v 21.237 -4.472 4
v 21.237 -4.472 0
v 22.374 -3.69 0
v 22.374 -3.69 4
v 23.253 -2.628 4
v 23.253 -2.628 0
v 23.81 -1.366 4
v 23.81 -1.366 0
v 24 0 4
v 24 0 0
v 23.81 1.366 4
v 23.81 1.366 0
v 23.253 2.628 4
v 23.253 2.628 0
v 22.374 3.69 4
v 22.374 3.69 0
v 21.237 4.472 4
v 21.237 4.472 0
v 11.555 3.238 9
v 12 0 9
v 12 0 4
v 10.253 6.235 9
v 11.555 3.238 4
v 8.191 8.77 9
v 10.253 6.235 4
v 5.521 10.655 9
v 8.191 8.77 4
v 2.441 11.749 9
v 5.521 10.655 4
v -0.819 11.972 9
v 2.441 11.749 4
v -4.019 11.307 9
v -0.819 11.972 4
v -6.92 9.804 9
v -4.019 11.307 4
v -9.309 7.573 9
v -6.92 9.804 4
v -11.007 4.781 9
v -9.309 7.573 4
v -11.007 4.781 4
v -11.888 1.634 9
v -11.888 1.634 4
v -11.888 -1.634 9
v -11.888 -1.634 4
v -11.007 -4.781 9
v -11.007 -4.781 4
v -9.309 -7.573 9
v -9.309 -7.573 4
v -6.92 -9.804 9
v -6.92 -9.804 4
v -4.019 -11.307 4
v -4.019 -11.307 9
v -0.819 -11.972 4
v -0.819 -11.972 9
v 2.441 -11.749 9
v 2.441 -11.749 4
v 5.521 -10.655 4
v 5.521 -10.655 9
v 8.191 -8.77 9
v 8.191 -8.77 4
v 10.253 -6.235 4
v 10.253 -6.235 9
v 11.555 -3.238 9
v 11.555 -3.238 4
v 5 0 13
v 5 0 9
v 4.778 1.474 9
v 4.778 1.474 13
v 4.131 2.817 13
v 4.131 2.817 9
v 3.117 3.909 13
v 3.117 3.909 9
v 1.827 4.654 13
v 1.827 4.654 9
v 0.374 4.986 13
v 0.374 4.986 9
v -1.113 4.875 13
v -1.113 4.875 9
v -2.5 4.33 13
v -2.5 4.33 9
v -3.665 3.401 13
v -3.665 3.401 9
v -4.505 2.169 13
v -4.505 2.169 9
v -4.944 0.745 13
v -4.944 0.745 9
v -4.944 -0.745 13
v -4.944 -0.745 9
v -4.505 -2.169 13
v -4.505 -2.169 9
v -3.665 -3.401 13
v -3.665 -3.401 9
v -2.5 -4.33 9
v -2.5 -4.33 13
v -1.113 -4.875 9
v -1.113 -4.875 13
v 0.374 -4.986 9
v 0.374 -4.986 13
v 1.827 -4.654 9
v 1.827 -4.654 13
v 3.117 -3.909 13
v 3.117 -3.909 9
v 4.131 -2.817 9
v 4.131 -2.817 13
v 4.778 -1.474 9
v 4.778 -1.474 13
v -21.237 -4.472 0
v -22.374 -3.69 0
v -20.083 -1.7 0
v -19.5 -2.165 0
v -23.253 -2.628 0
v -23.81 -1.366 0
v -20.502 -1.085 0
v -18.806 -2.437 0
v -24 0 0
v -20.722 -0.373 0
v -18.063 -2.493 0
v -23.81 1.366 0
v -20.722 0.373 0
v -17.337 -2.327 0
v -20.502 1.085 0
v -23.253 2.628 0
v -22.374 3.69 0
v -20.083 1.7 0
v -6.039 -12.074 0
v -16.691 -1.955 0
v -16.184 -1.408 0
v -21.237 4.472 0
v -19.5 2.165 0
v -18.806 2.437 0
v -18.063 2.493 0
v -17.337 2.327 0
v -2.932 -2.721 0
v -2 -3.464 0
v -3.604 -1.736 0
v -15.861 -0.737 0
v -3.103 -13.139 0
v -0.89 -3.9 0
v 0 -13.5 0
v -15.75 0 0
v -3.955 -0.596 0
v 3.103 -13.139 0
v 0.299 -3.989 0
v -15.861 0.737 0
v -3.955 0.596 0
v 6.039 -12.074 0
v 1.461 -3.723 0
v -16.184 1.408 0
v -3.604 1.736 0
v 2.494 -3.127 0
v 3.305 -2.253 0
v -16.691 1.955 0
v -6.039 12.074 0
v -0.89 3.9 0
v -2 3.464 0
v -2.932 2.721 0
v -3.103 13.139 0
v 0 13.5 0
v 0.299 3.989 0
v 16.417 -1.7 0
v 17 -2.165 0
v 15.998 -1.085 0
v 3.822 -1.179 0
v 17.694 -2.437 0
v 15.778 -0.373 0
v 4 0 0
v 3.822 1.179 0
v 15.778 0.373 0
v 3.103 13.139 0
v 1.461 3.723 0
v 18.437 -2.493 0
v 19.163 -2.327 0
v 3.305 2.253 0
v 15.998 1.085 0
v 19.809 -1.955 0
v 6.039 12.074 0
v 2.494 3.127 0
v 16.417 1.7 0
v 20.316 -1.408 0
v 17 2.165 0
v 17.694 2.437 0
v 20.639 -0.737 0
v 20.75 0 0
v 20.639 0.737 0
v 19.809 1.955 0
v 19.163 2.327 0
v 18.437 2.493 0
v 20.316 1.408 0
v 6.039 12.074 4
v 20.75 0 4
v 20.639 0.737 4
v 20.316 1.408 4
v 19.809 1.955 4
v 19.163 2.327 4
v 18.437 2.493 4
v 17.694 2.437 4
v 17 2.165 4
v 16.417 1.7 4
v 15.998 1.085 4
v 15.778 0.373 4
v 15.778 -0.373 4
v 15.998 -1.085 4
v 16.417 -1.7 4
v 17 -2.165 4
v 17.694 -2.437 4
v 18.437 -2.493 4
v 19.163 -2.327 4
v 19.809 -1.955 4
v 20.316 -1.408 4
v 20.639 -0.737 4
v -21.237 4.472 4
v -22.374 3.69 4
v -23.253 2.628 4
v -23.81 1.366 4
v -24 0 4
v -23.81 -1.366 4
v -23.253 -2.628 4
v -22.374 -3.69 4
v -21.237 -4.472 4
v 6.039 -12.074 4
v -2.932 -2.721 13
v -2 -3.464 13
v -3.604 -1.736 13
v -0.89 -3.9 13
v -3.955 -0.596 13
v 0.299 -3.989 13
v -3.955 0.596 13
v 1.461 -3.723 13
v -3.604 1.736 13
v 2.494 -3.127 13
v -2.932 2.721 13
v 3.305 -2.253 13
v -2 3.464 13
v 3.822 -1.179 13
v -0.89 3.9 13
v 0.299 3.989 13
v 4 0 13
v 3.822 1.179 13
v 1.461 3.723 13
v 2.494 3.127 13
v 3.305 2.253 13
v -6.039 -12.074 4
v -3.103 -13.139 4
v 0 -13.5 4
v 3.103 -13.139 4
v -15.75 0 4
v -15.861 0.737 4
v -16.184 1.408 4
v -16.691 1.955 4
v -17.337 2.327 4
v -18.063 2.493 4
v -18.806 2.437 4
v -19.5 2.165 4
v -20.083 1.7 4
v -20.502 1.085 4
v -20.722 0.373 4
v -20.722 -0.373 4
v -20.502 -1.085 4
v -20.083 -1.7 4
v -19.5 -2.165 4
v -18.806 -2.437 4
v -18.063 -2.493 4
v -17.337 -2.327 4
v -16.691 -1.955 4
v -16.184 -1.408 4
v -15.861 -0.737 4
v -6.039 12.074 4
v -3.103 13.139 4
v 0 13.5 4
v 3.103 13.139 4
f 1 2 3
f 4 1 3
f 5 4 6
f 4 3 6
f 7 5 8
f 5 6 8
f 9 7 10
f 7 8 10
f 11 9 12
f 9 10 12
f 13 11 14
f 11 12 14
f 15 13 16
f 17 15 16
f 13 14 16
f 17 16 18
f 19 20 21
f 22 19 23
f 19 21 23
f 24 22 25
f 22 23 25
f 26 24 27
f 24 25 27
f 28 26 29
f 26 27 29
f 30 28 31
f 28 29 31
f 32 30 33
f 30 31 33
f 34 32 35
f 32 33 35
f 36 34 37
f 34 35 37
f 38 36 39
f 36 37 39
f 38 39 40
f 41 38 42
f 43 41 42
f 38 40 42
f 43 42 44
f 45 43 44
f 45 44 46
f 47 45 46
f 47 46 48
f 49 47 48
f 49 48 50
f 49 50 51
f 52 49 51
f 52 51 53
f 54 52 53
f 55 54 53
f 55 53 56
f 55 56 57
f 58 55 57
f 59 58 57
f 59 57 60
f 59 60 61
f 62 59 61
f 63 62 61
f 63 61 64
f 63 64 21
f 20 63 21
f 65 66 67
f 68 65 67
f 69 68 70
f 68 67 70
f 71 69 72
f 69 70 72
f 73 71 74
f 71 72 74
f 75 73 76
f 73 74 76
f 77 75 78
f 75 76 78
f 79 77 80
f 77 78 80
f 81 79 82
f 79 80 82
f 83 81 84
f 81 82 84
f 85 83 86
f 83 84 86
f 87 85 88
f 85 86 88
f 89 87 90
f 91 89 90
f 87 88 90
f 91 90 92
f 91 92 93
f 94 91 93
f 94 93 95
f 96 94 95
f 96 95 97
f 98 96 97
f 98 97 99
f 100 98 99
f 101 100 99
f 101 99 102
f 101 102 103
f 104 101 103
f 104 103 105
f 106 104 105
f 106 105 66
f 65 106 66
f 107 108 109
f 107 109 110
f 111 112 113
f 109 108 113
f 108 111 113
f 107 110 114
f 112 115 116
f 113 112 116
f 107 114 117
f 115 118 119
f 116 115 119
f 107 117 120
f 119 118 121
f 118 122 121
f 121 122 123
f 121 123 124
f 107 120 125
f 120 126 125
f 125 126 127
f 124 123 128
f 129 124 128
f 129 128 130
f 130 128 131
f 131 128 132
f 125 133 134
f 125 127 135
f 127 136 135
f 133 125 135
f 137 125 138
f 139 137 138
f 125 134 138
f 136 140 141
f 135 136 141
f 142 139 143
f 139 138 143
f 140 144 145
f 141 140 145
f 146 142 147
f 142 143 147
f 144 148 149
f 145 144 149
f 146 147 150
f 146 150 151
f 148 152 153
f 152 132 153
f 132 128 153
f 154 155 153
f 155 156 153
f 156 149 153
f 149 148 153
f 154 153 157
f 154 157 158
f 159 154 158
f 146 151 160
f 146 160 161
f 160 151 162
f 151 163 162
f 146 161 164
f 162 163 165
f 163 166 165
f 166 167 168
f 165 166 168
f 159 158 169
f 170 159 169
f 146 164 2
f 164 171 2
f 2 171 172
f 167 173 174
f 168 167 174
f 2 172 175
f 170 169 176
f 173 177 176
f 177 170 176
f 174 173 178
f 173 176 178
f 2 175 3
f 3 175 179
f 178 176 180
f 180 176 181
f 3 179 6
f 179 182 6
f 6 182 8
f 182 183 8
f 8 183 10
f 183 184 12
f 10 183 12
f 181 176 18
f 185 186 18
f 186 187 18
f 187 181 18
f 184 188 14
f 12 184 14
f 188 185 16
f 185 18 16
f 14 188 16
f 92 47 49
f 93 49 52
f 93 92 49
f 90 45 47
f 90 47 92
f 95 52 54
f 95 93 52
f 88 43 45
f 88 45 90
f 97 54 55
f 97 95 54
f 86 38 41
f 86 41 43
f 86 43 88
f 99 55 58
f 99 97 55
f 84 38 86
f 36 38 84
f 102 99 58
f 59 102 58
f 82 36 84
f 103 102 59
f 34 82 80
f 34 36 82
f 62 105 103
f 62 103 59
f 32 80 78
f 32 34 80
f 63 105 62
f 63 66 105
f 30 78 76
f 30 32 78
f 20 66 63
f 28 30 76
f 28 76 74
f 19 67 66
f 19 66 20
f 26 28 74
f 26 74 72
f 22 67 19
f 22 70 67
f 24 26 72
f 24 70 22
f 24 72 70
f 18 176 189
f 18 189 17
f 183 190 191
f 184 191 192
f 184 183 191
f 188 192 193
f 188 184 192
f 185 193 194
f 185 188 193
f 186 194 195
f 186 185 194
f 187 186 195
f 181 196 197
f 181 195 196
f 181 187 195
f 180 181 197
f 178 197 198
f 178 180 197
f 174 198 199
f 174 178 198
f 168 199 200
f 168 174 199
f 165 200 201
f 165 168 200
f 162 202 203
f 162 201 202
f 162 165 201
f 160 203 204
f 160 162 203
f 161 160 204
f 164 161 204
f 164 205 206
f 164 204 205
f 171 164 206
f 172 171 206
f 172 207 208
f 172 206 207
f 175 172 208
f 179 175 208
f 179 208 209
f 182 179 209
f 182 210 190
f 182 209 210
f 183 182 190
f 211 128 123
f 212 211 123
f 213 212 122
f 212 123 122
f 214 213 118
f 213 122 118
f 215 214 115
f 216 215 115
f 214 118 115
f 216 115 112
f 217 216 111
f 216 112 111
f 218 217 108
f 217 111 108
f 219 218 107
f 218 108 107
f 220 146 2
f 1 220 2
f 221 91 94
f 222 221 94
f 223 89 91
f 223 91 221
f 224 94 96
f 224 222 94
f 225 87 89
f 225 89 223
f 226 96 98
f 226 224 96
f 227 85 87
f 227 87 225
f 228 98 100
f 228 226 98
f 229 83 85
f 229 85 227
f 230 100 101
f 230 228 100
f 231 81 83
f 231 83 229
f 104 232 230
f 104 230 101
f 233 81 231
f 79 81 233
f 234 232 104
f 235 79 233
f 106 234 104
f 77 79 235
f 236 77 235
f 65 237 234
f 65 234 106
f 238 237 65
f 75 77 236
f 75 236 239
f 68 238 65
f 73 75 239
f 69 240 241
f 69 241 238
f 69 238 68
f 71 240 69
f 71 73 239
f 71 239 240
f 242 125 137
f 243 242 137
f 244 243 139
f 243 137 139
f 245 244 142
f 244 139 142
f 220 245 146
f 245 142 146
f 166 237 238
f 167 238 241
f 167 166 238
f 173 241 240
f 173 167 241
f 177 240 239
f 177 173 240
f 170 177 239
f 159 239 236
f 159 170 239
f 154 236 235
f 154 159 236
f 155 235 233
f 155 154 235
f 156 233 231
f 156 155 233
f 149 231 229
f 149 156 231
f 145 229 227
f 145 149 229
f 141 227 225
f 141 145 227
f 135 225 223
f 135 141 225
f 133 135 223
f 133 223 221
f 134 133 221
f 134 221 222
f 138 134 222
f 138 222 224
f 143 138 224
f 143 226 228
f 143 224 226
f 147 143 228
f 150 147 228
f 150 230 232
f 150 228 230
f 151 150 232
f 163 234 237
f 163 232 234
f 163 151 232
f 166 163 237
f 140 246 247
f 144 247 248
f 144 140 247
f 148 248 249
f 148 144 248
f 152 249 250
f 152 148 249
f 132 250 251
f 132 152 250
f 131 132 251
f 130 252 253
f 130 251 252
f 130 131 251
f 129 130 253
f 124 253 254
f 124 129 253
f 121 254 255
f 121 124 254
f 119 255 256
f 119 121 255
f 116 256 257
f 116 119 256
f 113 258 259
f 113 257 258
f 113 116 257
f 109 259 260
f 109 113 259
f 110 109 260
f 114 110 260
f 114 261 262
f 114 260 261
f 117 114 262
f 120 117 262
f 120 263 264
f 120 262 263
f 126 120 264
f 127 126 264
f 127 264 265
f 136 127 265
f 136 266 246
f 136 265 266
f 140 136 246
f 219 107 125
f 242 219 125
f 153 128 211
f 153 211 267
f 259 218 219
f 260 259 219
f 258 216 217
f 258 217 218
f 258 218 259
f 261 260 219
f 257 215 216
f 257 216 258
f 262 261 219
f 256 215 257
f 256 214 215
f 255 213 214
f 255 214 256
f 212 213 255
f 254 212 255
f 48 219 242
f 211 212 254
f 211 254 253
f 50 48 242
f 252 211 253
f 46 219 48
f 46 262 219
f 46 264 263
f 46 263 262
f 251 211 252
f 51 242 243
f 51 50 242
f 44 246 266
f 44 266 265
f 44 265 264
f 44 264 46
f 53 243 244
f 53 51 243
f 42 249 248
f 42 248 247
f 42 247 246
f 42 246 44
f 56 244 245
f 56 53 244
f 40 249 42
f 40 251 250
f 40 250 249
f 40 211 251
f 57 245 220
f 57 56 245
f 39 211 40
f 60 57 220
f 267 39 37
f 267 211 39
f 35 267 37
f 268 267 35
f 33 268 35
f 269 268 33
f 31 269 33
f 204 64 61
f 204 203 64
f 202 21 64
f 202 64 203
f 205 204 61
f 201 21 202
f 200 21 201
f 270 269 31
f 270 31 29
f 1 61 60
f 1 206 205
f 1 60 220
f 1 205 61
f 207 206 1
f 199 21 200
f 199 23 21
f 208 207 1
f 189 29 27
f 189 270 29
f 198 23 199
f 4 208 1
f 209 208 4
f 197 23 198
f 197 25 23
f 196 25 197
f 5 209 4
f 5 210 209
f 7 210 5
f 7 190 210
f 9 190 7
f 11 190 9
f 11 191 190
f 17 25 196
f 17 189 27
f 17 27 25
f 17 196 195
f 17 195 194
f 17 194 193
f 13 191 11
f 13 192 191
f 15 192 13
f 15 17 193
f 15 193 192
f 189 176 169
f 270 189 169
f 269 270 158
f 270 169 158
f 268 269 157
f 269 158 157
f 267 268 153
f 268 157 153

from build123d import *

# Parameters (mm, degrees)
PAD003_DEPTH      = 4
SKETCH002_R       = 12
PAD_DEPTH         = 9
SKETCH003_R       = 5
PAD004_DEPTH      = 13
SKETCH001_R       = 4
SKETCH001_R_2     = 2.5
POCKET_DEPTH      = 0.001
POCKET_DEPTH_BACK = -13.001


with BuildPart() as part:
    # Sketch004 → Pad003 (new body)
    with BuildSketch(Plane.XY):
        with BuildLine():
            ThreePointArc((-21.23684, 4.47175), (-24, 0), (-21.23684, -4.47175))
            Line((-21.23684, -4.47175), (-6.039475, -12.073721))
            ThreePointArc((-6.039475, -12.073721), (0, -13.5), (6.039474, -12.073722))
            Line((6.039474, -12.073722), (21.236823, -4.471758))
            ThreePointArc((21.236823, -4.471758), (24, 0), (21.236823, 4.471758))
            Line((6.039474, 12.073722), (21.236823, 4.471758))
            ThreePointArc((6.039474, 12.073722), (0, 13.5), (-6.039475, 12.073721))
            Line((-21.23684, 4.47175), (-6.039475, 12.073721))
        make_face()
    extrude(amount=PAD003_DEPTH)

    # Sketch002 → Pad (join)
    with BuildSketch(Plane.XY):
        Circle(SKETCH002_R)
    extrude(amount=PAD_DEPTH)

    # Sketch003 → Pad004 (join)
    with BuildSketch(Plane.XY):
        Circle(SKETCH003_R)
    extrude(amount=PAD004_DEPTH)

    # Sketch001 → Pocket (cut, two sides)
    with BuildSketch(Plane.XY) as pocket_sk:
        Circle(SKETCH001_R)
        with Locations((18.25, 0)):
            Circle(SKETCH001_R_2)
        with Locations((-18.25, 0)):
            Circle(SKETCH001_R_2)
    extrude(amount=-POCKET_DEPTH, mode=Mode.SUBTRACT)
    extrude(pocket_sk.sketch, amount=-POCKET_DEPTH_BACK, mode=Mode.SUBTRACT)


solid = part.part
